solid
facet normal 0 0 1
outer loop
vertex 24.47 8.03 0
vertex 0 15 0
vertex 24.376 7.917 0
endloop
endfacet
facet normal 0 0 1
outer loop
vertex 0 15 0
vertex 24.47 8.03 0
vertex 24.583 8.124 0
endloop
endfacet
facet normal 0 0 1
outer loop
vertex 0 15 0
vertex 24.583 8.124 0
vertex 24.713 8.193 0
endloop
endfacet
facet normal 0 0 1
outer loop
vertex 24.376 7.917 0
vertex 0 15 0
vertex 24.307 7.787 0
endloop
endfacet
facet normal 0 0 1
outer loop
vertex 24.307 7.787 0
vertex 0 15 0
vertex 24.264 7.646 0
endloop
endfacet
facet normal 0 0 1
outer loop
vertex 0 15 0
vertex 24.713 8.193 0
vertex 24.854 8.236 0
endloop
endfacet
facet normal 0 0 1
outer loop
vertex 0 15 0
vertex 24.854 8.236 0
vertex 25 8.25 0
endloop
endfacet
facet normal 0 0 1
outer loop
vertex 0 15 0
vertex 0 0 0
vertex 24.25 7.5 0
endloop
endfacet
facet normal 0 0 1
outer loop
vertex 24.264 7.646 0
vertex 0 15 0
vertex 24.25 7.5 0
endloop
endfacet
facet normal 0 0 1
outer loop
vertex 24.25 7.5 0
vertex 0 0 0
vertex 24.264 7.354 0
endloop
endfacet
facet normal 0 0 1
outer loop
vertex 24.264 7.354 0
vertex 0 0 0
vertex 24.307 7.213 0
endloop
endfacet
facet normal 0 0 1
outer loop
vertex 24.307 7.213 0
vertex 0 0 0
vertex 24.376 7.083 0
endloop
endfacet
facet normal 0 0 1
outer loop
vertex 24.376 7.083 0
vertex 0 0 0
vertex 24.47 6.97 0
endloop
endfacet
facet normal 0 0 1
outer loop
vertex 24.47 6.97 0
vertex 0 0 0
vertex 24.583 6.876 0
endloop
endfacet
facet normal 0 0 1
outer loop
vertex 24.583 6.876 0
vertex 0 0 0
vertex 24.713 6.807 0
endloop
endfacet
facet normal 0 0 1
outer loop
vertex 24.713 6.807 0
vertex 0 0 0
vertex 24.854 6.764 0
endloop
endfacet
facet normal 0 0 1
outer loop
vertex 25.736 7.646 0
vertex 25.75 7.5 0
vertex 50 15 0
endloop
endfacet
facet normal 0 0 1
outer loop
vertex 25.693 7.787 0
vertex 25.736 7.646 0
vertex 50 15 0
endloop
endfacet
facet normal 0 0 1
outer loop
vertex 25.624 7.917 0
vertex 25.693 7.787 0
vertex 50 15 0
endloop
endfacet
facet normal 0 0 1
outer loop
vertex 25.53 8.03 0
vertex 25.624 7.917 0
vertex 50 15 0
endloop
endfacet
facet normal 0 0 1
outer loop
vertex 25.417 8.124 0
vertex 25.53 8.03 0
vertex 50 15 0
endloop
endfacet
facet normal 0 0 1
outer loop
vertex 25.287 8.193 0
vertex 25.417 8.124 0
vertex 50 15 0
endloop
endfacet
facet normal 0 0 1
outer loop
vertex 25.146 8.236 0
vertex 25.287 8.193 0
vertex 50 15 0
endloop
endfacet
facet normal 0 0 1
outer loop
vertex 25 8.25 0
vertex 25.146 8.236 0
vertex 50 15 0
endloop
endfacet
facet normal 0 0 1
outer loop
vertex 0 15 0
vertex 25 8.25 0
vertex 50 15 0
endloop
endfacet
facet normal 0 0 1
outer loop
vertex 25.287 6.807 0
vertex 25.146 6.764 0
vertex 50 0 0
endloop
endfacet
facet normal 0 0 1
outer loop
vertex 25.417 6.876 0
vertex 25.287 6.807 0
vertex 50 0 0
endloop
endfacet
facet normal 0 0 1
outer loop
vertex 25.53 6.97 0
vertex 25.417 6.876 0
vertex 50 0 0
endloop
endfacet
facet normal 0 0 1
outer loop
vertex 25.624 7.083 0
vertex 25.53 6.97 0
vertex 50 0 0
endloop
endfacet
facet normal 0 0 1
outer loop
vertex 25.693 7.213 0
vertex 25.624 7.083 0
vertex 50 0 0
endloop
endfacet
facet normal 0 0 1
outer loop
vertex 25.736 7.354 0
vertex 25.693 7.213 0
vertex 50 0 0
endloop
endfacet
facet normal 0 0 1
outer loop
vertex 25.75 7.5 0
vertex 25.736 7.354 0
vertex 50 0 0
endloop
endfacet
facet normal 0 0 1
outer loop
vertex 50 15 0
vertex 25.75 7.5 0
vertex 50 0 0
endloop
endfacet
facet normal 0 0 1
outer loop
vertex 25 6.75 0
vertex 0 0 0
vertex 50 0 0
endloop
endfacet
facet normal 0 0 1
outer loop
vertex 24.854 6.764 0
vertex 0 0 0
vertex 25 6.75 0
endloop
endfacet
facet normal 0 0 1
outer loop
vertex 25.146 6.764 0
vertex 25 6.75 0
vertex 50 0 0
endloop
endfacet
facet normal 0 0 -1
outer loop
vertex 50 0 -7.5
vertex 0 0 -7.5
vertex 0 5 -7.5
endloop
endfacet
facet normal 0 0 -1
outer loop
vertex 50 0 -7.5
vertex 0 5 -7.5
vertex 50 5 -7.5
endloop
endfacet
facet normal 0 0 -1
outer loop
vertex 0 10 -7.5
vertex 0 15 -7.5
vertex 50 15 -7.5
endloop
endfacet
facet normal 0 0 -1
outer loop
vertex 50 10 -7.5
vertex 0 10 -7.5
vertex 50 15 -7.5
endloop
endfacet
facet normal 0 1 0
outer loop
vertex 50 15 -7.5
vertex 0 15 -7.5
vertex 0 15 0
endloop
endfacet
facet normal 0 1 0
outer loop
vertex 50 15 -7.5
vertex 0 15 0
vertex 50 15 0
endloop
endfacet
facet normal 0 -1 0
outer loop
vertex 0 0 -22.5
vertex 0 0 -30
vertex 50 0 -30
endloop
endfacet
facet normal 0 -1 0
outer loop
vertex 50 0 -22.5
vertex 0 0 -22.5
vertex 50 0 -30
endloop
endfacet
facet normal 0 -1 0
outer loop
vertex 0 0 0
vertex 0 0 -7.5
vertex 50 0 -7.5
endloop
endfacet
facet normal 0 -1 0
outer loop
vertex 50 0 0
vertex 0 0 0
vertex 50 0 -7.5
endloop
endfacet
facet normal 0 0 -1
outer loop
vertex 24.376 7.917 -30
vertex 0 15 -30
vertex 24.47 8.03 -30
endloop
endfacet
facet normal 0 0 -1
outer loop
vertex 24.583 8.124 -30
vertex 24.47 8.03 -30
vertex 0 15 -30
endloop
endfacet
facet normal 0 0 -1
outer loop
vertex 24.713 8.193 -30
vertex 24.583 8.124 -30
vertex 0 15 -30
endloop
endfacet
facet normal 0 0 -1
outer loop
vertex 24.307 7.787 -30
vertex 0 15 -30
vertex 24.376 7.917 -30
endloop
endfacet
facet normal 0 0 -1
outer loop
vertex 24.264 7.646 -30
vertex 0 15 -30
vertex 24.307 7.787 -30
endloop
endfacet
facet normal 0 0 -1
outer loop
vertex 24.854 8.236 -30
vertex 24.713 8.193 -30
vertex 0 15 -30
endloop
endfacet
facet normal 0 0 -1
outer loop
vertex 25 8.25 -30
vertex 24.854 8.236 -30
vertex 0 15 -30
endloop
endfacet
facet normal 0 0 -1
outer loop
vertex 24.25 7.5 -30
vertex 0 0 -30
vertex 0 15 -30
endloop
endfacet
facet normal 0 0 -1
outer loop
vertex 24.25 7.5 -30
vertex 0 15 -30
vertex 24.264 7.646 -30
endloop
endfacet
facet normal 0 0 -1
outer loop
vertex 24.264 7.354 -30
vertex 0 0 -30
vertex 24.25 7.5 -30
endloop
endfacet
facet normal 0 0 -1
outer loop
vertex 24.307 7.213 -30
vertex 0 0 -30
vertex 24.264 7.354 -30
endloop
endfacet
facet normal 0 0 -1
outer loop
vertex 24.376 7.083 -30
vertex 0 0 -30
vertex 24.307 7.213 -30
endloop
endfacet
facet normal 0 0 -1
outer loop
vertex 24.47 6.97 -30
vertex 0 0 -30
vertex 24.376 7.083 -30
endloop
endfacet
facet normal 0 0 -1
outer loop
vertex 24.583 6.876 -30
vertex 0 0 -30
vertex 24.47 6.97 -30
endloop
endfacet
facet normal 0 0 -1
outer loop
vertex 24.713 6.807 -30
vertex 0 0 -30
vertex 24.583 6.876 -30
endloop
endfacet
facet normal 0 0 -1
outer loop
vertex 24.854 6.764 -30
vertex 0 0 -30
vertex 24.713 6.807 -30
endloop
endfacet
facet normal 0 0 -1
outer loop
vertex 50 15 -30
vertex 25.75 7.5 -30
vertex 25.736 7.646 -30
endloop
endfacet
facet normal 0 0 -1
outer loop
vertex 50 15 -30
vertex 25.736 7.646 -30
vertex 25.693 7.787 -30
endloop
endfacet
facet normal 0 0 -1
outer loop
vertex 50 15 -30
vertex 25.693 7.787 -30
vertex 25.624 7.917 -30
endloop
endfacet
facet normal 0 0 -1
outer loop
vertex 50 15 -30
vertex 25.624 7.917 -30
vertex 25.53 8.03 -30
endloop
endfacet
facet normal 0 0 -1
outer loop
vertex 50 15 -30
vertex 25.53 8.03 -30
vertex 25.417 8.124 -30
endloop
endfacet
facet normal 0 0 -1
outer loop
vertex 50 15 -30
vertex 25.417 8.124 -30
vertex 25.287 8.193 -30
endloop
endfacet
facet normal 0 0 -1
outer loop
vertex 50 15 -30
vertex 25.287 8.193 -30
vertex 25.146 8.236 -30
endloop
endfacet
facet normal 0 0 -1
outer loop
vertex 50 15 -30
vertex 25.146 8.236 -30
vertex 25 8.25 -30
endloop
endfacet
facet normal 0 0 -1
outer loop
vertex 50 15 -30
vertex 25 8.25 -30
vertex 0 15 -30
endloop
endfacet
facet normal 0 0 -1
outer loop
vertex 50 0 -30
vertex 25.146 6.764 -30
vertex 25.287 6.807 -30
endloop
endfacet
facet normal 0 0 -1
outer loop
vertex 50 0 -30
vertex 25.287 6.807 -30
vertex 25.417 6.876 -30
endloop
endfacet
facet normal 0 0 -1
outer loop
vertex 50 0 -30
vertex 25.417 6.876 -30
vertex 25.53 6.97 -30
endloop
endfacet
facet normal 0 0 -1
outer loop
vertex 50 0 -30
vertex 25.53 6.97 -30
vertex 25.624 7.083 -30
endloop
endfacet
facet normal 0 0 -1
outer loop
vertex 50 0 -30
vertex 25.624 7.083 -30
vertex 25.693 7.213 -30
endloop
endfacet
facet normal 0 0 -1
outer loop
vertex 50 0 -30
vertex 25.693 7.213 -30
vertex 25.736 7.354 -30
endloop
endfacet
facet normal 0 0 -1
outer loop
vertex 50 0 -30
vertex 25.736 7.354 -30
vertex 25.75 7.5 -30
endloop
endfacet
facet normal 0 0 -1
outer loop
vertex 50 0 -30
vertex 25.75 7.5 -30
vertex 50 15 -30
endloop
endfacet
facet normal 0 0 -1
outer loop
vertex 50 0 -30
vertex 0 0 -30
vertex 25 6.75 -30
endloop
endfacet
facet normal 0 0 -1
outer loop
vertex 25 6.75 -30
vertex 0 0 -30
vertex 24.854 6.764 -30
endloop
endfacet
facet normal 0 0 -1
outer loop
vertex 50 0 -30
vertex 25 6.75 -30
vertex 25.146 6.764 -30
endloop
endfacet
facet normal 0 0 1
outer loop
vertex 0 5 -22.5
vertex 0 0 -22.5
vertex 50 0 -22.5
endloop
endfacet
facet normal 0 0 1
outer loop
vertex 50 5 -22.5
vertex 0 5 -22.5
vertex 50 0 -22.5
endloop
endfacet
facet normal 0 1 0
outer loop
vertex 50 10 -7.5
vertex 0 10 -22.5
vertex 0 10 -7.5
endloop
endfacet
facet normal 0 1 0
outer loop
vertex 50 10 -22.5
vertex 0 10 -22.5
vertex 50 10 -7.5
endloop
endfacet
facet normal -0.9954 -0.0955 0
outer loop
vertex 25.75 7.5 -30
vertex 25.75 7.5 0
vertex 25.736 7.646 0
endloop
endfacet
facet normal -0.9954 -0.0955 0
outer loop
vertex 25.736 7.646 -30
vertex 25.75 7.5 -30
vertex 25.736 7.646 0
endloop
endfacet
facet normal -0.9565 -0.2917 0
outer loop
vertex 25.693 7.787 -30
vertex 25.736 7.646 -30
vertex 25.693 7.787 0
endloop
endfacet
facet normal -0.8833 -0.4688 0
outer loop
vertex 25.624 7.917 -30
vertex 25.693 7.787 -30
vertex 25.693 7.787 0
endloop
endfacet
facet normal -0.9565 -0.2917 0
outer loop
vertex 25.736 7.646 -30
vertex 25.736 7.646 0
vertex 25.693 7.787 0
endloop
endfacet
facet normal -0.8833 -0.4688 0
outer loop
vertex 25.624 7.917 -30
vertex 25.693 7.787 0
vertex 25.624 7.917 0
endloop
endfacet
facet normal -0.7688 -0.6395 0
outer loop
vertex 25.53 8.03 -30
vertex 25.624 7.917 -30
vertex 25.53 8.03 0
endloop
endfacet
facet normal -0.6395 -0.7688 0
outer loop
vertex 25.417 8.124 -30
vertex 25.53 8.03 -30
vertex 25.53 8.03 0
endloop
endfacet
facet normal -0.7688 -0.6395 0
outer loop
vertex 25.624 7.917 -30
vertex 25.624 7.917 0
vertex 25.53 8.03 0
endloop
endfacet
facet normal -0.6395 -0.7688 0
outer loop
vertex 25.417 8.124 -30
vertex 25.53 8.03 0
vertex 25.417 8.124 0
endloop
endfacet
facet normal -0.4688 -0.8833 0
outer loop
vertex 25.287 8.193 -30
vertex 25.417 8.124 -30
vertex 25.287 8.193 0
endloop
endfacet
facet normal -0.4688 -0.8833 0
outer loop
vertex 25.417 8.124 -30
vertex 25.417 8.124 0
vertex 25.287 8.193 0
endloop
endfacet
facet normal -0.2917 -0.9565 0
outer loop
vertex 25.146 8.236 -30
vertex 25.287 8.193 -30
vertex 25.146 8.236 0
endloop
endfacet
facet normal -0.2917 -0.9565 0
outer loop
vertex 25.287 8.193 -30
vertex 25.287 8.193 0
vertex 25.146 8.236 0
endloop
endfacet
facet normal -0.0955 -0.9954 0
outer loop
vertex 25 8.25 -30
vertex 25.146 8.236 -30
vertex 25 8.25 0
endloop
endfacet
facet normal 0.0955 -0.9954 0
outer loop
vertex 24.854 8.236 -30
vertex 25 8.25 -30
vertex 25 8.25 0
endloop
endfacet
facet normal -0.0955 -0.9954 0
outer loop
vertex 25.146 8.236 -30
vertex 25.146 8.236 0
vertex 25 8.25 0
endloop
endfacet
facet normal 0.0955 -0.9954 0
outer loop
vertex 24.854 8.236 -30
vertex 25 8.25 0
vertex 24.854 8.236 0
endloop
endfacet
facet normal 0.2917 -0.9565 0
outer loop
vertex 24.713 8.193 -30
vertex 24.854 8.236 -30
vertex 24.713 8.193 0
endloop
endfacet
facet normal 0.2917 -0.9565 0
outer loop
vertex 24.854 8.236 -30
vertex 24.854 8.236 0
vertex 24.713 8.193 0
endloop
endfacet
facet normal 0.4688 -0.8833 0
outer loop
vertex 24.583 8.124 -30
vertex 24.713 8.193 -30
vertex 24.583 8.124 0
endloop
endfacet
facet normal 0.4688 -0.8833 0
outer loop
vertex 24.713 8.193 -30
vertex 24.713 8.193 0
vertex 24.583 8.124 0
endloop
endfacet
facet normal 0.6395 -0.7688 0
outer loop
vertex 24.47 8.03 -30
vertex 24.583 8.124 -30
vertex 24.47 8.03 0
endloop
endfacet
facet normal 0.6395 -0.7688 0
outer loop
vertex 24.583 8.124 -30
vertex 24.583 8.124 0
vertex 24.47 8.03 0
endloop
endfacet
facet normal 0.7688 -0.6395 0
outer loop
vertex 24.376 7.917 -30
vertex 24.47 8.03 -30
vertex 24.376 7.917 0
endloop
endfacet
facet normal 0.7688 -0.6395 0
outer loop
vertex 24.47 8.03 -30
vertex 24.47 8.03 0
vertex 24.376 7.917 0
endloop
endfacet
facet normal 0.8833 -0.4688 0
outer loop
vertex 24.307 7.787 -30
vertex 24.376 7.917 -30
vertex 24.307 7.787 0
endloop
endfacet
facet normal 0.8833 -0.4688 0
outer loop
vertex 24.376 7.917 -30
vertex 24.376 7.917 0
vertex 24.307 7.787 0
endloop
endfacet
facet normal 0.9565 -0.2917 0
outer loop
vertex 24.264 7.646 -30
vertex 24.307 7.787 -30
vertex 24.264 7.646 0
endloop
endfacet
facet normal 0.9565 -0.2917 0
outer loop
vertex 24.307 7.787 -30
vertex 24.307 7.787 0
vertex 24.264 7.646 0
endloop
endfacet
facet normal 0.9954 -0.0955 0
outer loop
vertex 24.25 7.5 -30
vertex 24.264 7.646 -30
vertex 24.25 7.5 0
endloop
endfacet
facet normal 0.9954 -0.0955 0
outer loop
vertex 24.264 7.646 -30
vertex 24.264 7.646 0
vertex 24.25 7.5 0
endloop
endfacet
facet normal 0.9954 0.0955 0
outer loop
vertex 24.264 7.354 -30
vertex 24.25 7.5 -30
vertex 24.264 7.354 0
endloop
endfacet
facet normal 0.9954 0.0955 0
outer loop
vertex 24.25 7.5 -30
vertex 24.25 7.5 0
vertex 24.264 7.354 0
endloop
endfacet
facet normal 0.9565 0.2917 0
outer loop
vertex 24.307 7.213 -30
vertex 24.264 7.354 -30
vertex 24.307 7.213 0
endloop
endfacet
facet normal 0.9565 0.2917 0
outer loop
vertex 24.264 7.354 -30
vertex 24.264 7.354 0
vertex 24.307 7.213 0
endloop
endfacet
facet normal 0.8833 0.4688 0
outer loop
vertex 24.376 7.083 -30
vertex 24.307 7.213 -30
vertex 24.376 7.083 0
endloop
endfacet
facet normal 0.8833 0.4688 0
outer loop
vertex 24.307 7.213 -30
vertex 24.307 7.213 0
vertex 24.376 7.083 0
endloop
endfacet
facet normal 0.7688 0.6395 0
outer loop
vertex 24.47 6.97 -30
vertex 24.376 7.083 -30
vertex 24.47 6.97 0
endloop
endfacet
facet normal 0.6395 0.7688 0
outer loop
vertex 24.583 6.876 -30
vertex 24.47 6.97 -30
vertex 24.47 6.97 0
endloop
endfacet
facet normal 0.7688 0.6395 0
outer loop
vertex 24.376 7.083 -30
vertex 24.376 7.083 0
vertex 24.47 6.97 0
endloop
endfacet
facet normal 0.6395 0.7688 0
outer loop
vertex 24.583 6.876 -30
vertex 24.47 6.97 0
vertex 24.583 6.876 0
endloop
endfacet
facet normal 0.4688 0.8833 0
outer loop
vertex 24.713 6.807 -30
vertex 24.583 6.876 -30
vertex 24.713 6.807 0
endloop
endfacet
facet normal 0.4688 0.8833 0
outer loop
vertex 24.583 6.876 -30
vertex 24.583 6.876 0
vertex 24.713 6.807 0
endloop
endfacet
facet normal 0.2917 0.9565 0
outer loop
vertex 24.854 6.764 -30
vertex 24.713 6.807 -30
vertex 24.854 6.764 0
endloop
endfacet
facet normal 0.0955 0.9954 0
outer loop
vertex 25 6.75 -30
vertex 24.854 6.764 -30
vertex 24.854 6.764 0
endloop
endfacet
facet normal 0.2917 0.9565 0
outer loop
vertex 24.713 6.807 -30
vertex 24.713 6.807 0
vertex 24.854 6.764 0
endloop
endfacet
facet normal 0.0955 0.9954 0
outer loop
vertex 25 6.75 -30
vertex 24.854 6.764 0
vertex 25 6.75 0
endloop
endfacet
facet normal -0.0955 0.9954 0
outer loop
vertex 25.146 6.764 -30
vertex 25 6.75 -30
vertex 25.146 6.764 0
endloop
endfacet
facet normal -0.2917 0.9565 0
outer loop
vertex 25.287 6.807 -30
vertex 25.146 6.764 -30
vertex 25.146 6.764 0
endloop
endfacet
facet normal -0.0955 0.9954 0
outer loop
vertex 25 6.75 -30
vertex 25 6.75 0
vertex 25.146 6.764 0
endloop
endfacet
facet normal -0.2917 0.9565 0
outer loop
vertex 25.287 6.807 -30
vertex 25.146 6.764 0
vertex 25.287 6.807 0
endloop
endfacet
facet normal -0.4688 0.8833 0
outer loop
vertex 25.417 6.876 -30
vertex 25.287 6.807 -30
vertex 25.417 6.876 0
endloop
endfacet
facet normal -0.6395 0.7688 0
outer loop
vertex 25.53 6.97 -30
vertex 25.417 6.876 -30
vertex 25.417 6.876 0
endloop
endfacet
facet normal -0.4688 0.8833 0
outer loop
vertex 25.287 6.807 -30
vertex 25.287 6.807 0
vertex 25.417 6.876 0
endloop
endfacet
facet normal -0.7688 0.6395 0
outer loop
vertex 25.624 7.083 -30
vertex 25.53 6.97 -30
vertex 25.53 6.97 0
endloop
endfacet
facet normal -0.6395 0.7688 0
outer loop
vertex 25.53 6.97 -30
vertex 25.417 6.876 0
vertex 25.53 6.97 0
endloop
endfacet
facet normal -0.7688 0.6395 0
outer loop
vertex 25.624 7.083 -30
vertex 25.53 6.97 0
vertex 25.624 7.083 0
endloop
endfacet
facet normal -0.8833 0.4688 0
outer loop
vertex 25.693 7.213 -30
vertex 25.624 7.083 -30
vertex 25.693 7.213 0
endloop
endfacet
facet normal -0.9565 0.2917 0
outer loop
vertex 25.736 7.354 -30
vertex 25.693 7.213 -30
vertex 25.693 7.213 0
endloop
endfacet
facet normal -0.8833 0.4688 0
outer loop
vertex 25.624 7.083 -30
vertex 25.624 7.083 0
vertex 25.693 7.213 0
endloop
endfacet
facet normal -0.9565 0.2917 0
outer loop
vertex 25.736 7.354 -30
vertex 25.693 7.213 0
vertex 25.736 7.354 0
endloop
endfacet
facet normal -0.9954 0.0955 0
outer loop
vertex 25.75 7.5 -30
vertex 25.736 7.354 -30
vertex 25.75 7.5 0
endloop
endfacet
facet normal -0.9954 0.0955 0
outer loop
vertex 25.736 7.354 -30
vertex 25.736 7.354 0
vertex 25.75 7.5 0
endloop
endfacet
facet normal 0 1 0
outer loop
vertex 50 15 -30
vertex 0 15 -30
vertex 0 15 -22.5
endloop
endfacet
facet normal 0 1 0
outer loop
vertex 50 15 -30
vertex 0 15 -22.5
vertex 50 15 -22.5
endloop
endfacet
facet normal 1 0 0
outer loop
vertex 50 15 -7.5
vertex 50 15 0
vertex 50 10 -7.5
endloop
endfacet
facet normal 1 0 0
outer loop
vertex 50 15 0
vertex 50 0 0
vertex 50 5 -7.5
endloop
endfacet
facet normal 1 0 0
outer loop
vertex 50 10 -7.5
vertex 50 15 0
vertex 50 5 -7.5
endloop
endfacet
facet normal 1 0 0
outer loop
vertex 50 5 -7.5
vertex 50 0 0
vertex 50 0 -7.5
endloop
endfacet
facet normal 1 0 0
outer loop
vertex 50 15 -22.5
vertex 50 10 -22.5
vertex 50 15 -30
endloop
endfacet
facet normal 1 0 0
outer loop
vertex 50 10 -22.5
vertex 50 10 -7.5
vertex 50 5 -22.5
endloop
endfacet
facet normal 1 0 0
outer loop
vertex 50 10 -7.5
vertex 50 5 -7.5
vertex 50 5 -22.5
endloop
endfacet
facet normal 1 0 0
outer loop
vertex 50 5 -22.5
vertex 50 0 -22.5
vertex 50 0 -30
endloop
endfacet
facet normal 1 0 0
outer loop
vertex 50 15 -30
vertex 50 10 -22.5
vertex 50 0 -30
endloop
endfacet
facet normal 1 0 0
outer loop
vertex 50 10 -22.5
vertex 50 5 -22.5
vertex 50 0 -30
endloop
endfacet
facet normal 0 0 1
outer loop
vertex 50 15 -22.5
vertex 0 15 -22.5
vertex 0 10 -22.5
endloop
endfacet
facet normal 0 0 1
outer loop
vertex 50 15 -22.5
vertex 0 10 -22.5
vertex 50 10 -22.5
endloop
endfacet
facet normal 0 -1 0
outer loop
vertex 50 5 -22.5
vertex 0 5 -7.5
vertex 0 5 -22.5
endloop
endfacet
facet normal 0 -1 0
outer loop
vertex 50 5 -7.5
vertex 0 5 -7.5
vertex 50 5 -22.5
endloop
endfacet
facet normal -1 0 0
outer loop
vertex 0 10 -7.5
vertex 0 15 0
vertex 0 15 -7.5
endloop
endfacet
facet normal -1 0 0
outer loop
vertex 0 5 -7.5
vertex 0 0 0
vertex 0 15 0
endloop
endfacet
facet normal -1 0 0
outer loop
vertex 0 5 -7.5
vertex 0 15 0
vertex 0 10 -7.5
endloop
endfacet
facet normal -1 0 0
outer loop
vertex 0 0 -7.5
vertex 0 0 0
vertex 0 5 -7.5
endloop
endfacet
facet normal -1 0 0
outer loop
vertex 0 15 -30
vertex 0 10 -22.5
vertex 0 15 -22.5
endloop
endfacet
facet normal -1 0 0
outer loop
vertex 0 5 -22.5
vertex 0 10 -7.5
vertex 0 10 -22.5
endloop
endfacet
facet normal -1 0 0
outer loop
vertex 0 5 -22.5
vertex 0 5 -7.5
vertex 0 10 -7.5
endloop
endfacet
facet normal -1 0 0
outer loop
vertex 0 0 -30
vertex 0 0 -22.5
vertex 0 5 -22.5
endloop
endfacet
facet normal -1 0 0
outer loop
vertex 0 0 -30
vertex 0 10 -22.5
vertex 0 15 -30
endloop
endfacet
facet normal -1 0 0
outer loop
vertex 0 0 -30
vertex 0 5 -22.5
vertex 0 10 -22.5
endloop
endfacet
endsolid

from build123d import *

# Parameters (mm, degrees)
SKETCH1_W           = 50
SKETCH1_H           = 30
BOSS_EXTRUDE1_DEPTH = 15
SKETCH2_W           = 50
SKETCH2_H           = 15
CUT_EXTRUDE1_DEPTH  = 5
SKETCH3_W           = 50
SKETCH3_H           = 15
CUT_EXTRUDE2_DEPTH  = 5
SKETCH4_R           = 0.75
CUT_EXTRUDE3_DEPTH  = 30


with BuildPart() as part:
    # Sketch1 → Boss-Extrude1 (new body)
    with BuildSketch(Plane(origin=(0, 0, 0), x_dir=(1, 0, 0), z_dir=(0, 1, 0))):
        with Locations((25, 15)):
            Rectangle(SKETCH1_W, SKETCH1_H)
    extrude(amount=BOSS_EXTRUDE1_DEPTH)

    # Sketch2 → Cut-Extrude1 (cut)
    with BuildSketch(Plane(origin=(0, 15, 0), x_dir=(1, 0, 0), z_dir=(0, 1, 0))):
        with Locations((25, 15)):
            Rectangle(SKETCH2_W, SKETCH2_H)
    extrude(amount=-CUT_EXTRUDE1_DEPTH, mode=Mode.SUBTRACT)

    # Sketch3 → Cut-Extrude2 (cut)
    with BuildSketch(Plane.XZ):
        with Locations((25, -15)):
            Rectangle(SKETCH3_W, SKETCH3_H)
    extrude(amount=-CUT_EXTRUDE2_DEPTH, mode=Mode.SUBTRACT)

    # Sketch4 → Cut-Extrude3 (cut)
    with BuildSketch(Plane.XY):
        with Locations((25, 7.5)):
            Circle(SKETCH4_R)
    extrude(amount=-CUT_EXTRUDE3_DEPTH, mode=Mode.SUBTRACT)


solid = part.part
